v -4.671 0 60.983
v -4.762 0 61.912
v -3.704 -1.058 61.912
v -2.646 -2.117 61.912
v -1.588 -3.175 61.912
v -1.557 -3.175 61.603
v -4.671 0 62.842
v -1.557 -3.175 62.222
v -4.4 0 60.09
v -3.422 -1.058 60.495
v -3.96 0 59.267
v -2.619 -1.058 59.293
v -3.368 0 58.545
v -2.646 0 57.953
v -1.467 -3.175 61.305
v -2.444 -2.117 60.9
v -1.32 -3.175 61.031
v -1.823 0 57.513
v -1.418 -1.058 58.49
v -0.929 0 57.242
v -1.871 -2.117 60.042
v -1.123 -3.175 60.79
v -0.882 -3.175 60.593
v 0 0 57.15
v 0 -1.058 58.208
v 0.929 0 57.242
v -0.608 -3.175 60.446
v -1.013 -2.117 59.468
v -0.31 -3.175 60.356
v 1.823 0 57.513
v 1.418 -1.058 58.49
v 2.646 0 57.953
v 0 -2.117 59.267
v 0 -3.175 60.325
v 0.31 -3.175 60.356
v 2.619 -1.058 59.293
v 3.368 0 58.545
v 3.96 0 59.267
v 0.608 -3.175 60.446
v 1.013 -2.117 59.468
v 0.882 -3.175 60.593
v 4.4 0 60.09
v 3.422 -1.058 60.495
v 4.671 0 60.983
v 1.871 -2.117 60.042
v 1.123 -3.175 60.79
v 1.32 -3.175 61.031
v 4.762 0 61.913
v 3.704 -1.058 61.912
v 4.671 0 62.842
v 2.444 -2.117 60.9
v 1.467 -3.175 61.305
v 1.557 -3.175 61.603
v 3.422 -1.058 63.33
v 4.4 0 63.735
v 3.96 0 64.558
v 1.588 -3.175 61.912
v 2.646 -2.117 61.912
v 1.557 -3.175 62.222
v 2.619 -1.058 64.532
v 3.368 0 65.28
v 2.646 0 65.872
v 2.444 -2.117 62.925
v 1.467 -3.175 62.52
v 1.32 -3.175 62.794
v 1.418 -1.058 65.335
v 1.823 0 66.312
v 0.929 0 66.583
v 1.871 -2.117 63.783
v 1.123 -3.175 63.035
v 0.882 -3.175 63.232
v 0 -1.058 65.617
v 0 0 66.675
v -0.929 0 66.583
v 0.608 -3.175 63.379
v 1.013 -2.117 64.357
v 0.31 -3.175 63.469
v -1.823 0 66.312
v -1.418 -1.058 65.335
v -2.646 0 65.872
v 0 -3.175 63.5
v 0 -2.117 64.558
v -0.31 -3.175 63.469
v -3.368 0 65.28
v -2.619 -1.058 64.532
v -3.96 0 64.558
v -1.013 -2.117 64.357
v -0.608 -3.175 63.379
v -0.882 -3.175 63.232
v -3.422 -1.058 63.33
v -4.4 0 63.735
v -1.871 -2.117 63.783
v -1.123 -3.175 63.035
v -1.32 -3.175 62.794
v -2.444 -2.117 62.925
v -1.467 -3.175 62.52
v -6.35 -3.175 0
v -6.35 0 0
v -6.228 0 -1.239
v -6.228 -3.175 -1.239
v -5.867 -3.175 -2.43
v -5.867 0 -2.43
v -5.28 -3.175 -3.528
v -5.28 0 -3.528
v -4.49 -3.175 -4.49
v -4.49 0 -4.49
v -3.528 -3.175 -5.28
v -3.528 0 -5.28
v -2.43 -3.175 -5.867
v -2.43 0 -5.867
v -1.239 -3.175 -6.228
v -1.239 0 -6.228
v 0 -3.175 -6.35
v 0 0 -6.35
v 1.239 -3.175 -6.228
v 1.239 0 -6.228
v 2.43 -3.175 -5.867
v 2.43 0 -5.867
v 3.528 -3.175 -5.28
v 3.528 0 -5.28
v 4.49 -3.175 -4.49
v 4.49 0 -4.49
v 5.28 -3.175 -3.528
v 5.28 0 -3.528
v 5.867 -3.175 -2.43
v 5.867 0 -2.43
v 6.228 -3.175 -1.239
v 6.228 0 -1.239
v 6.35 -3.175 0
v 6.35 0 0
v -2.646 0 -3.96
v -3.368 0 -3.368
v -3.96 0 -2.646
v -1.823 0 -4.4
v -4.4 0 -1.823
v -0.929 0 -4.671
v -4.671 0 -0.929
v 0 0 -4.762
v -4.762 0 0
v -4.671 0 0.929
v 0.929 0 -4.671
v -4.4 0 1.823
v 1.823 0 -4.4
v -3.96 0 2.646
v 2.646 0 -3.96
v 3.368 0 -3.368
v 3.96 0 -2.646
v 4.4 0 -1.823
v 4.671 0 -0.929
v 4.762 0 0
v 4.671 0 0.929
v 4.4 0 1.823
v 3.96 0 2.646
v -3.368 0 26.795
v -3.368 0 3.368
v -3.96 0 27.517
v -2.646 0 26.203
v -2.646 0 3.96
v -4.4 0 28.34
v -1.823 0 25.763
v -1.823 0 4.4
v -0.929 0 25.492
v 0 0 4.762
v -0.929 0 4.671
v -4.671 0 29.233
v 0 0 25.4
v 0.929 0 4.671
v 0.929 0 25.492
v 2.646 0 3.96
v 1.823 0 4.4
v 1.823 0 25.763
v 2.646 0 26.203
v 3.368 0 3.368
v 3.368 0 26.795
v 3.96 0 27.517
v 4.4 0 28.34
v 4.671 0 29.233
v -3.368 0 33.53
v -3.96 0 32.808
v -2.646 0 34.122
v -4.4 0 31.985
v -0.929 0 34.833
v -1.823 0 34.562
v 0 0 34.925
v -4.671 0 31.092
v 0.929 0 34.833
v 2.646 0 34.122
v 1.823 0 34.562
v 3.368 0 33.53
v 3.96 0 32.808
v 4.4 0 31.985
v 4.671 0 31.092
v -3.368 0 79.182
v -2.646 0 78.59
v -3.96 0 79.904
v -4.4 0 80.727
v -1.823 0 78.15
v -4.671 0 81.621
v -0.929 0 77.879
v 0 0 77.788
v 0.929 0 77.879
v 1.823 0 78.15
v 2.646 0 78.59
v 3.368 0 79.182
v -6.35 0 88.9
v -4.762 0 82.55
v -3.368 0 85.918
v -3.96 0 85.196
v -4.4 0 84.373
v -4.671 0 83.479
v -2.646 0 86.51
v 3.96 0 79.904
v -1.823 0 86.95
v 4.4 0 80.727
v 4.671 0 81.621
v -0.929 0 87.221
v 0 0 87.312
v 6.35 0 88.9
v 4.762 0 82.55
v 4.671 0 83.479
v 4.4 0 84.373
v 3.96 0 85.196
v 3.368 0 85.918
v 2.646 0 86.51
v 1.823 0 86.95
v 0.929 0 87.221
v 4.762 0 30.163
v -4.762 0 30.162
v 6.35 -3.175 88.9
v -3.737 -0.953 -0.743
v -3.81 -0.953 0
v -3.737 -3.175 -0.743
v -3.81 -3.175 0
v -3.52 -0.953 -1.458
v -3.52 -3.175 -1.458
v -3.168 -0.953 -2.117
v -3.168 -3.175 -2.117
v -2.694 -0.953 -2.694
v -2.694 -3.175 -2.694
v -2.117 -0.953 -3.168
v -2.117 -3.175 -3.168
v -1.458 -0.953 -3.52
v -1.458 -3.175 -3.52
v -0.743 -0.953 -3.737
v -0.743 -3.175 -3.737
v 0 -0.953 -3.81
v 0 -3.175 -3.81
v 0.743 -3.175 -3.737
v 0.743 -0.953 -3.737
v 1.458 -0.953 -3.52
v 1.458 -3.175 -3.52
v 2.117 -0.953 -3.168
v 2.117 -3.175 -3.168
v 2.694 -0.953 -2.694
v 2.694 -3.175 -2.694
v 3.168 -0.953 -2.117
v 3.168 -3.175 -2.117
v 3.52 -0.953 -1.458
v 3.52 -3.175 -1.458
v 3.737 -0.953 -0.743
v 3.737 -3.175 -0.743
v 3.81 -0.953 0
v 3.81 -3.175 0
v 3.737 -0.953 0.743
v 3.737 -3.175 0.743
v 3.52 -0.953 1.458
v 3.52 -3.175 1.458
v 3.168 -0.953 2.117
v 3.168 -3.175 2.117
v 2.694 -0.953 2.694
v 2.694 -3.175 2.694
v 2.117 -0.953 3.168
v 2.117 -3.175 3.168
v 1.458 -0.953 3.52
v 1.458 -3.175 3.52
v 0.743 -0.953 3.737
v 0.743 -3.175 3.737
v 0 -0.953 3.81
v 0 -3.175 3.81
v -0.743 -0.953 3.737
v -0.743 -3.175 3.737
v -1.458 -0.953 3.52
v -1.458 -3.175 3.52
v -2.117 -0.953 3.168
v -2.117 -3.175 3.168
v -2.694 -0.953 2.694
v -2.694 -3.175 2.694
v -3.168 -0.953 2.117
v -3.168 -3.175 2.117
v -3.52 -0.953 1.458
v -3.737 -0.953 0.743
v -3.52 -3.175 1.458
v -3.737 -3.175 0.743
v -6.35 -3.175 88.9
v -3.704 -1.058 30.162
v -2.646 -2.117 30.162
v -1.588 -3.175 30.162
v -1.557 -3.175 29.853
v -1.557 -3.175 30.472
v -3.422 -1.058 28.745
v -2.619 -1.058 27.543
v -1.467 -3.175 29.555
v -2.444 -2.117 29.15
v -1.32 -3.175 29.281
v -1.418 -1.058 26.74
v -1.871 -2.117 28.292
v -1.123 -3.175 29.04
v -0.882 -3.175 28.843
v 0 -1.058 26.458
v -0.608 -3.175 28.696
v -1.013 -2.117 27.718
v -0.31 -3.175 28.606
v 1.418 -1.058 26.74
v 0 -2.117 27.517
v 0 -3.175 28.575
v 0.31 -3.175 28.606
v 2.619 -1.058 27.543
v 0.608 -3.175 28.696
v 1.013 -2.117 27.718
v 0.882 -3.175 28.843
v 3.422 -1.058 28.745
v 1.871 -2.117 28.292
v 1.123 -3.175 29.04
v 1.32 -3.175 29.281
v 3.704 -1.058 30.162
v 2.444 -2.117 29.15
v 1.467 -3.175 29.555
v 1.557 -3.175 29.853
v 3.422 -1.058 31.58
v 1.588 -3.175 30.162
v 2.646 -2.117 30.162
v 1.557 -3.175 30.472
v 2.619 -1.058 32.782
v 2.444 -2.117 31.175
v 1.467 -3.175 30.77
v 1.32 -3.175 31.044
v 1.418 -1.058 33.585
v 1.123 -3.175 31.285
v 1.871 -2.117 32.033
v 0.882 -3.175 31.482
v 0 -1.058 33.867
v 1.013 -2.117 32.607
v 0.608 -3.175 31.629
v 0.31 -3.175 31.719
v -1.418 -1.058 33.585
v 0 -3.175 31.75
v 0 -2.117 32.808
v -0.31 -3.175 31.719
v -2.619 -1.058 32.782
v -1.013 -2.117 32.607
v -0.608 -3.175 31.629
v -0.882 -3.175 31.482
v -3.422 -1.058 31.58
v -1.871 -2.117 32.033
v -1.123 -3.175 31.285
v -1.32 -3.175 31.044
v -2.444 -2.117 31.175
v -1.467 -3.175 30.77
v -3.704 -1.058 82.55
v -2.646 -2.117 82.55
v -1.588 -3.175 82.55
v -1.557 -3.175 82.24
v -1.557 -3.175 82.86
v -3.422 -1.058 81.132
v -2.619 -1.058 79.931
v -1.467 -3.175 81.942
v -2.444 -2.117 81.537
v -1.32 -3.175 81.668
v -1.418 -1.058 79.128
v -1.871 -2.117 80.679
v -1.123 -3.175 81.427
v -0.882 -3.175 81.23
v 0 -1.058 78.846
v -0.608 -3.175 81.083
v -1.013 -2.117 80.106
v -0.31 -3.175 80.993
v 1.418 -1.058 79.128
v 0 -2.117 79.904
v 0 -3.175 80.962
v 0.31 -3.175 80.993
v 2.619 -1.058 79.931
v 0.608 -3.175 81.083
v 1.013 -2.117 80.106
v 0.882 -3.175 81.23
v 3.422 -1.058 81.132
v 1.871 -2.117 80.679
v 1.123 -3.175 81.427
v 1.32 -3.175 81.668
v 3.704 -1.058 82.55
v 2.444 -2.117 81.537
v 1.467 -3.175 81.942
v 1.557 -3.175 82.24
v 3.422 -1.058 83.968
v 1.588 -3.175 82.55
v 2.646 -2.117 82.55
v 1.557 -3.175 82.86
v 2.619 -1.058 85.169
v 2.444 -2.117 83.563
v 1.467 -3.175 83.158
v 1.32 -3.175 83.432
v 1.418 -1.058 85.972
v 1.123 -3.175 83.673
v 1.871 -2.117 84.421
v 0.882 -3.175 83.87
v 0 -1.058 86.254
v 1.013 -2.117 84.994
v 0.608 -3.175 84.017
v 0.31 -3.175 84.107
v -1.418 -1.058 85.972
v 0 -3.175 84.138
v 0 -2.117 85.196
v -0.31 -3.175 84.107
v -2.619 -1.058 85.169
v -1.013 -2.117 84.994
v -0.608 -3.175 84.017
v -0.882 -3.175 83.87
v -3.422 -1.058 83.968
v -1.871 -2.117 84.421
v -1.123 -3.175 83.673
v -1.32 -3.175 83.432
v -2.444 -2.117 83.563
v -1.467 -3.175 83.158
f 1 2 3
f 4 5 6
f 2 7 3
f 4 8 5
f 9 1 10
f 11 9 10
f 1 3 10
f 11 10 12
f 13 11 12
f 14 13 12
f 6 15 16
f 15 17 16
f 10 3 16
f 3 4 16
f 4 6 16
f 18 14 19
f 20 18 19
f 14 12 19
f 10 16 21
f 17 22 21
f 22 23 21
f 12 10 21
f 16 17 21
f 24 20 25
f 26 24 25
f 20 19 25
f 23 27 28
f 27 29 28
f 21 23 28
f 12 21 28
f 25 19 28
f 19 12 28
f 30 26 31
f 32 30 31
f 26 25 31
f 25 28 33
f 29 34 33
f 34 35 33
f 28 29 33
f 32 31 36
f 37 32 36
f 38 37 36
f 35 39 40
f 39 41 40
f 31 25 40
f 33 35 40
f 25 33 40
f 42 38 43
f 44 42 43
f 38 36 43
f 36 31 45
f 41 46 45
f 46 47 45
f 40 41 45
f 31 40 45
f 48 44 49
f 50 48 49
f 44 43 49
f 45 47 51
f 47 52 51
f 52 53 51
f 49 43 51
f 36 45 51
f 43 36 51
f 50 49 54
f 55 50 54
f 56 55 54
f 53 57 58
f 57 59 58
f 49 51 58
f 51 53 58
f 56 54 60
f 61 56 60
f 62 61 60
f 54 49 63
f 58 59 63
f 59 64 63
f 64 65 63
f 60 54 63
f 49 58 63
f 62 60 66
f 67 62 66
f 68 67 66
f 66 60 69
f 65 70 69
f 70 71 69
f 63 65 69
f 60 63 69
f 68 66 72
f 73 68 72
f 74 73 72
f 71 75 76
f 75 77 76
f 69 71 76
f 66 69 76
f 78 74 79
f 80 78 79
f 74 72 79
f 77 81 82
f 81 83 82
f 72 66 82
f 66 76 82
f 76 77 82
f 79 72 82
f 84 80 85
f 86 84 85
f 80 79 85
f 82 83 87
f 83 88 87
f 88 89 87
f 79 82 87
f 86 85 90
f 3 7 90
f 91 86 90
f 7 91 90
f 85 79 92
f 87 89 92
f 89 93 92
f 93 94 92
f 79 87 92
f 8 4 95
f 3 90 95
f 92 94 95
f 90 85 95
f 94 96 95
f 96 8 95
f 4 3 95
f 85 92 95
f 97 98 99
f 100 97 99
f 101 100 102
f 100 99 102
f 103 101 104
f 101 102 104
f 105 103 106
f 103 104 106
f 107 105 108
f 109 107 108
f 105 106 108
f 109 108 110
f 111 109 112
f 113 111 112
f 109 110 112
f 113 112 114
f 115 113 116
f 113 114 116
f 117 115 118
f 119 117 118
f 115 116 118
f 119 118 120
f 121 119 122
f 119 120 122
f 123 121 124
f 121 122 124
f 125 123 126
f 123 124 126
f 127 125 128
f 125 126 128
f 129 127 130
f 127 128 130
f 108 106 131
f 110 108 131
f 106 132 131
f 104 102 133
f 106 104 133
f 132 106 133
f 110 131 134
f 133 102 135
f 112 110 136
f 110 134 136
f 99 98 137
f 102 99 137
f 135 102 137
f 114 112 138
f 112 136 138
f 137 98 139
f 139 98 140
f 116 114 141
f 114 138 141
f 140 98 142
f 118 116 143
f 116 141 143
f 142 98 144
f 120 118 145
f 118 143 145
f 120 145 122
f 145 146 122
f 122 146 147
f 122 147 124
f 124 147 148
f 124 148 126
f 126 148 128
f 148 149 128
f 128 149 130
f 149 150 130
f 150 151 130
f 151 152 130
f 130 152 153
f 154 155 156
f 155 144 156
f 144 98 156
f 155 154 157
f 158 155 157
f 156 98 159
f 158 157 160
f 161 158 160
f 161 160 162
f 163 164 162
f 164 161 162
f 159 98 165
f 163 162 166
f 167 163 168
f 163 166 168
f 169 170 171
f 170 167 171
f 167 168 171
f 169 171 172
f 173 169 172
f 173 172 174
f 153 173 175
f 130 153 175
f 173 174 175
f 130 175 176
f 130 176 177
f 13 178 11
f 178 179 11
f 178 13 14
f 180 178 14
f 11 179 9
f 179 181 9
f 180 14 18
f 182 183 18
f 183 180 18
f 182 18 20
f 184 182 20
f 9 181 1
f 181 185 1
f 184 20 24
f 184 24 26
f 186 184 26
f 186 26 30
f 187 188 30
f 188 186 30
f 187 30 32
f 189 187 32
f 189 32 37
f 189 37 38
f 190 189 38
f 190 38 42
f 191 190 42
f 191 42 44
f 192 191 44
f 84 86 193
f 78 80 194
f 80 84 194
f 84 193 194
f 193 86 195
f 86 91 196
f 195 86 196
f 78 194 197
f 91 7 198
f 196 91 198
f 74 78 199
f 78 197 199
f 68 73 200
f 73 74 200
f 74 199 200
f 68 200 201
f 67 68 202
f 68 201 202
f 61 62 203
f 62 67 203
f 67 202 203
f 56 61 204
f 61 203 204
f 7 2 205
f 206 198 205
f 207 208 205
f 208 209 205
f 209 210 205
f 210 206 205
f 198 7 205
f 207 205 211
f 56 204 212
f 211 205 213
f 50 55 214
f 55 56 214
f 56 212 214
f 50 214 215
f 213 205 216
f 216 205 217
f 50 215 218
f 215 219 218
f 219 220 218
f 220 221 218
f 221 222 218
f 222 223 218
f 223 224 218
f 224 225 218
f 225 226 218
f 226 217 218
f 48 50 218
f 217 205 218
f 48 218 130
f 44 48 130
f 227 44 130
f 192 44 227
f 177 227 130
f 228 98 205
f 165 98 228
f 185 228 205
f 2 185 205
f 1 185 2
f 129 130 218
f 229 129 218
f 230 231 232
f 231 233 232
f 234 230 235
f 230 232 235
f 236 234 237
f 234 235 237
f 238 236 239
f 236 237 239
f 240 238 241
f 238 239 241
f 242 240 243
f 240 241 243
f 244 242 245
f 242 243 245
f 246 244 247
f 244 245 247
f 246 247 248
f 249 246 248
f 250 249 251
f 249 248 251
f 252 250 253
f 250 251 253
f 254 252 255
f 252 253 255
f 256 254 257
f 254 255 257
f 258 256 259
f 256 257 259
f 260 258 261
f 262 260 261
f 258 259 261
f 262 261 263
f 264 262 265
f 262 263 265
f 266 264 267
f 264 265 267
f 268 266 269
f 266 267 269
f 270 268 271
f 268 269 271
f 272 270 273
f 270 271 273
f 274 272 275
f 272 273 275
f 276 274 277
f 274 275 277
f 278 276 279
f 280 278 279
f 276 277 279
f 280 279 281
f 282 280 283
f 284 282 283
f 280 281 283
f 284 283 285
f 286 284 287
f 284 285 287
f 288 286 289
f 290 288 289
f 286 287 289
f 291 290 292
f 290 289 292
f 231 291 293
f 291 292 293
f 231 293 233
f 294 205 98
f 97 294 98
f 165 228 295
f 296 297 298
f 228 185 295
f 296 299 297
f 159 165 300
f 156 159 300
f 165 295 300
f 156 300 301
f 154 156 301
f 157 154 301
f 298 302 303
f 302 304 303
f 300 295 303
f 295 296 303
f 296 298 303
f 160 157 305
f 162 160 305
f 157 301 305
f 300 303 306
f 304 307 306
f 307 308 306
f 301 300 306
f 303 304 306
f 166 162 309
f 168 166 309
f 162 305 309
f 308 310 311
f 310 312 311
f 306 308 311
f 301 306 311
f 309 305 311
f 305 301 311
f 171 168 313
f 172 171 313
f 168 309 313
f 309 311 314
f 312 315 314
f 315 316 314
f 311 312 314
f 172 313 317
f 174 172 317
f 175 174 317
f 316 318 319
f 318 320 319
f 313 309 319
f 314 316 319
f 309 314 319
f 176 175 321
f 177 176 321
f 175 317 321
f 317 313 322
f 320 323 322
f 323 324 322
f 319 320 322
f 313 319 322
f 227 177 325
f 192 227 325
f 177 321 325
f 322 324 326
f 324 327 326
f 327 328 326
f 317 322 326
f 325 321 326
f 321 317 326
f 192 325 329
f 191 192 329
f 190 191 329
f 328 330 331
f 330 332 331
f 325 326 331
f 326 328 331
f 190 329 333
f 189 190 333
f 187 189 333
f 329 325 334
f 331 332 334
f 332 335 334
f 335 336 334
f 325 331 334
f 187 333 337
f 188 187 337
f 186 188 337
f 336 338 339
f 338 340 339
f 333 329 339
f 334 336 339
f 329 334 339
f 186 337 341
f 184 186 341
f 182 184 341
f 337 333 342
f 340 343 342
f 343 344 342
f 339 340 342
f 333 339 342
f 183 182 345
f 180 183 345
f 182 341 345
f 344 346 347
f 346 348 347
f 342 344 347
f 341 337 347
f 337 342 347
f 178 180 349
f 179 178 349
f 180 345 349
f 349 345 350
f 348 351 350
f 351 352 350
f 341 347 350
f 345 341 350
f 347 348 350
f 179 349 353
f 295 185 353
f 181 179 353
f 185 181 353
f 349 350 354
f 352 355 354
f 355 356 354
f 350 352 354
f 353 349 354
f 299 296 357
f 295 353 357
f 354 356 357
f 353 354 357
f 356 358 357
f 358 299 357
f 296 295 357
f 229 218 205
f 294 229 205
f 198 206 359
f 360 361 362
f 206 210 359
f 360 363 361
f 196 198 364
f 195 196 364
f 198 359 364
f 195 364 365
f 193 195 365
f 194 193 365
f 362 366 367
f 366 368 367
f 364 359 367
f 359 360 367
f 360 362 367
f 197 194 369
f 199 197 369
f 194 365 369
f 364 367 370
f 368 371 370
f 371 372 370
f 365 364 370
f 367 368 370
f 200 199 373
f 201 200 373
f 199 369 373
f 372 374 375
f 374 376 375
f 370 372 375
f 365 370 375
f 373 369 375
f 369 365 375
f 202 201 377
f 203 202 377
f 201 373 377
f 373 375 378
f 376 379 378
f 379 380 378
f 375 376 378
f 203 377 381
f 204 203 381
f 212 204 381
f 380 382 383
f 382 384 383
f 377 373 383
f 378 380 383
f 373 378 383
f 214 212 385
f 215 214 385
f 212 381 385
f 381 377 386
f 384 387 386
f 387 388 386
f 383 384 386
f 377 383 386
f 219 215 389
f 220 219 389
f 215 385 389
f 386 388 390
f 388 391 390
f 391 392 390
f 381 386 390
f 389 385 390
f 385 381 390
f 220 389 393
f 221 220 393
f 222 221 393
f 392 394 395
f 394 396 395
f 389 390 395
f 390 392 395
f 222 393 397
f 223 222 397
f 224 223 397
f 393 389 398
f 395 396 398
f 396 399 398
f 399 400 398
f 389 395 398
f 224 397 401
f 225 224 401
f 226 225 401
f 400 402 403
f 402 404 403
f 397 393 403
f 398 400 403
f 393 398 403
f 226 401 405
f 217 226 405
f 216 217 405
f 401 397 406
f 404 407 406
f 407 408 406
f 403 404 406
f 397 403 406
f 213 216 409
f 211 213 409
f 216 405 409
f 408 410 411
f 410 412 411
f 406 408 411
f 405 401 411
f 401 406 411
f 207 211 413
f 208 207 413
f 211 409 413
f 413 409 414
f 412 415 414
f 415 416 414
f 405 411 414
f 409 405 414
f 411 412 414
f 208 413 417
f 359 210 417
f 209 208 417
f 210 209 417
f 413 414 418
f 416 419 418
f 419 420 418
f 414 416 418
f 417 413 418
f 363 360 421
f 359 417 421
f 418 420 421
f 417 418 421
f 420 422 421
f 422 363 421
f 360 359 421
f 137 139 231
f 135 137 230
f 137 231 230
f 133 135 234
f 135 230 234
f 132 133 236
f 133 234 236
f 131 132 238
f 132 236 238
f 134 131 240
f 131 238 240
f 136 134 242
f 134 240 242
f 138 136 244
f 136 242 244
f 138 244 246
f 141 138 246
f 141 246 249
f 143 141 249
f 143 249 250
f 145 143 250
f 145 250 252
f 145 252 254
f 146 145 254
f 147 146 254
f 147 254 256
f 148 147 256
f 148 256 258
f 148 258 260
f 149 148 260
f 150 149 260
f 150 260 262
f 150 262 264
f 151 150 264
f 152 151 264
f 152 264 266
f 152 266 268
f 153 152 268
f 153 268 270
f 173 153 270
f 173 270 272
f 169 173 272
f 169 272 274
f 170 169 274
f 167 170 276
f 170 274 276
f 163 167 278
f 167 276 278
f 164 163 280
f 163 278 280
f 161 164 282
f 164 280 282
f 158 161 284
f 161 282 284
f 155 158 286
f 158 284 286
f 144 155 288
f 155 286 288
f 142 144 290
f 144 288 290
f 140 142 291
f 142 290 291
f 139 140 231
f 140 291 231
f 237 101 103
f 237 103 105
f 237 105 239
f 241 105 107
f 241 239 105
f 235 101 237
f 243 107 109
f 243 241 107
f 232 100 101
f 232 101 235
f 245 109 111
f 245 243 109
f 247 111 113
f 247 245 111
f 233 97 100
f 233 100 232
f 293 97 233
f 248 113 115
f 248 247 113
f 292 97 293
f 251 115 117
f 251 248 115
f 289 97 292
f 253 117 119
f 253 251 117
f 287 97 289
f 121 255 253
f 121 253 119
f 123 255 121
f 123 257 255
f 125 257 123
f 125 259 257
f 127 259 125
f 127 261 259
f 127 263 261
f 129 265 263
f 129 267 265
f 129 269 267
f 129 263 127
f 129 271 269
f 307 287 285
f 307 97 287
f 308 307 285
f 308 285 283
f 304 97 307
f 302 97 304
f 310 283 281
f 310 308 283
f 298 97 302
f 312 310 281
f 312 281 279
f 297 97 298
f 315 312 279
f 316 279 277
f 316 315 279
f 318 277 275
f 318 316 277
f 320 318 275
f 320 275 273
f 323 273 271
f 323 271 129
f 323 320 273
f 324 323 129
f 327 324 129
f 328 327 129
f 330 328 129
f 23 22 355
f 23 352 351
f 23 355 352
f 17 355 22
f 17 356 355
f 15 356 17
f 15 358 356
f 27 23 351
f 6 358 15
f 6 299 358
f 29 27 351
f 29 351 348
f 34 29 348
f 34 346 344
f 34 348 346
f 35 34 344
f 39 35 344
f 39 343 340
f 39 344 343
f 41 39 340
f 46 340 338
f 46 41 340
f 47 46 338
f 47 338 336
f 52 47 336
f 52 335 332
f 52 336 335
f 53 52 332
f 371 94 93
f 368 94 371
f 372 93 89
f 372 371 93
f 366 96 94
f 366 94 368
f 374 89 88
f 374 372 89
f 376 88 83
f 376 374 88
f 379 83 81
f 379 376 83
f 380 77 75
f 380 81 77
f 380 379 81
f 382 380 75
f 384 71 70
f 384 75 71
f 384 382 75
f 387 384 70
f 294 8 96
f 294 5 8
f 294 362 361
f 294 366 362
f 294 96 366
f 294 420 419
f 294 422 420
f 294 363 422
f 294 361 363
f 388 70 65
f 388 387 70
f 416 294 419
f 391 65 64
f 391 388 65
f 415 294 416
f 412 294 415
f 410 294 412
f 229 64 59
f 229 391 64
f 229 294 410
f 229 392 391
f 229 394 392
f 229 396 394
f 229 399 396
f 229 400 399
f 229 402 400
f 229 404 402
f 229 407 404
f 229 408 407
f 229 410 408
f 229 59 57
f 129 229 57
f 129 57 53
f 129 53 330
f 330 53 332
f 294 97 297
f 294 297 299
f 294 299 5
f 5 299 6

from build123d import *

# Parameters (mm, degrees)
F1_DEPTH       = 3.175
F2_D           = 2.54
F2_CSINK_D     = 9.525
F2_CSINK_ANGLE = 90
F3_D           = 7.62
F3_CSINK_D     = 9.525
F3_CSINK_ANGLE = 90


with BuildPart() as f1:
    # F0 (on Front) → F1 (new body)
    with BuildSketch(Plane.XZ):
        with BuildLine():
            Line((6.35, 0), (6.35, 88.9))
            Line((6.35, 88.9), (-6.35, 88.9))
            Line((-6.35, 88.9), (-6.35, 0))
            ThreePointArc((-6.35, 0), (0, -6.35), (6.35, 0))
        make_face()
    extrude(amount=F1_DEPTH)

    # F2 (through all)
    with Locations(Plane(origin=(0, 0, 0), x_dir=(1, 0, 0), z_dir=(0, 1, 0))):
        with Locations((0, -82.55), (0, -61.9125), (0, -30.1625)):
            CounterSinkHole(F2_D / 2, F2_CSINK_D / 2, counter_sink_angle=F2_CSINK_ANGLE)

    # F3 (through all)
    with Locations(Plane(origin=(0, 0, 0), x_dir=(1, 0, 0), z_dir=(0, 1, 0))):
        with Locations((0, 0)):
            CounterSinkHole(F3_D / 2, F3_CSINK_D / 2, counter_sink_angle=F3_CSINK_ANGLE)


solid = f1.part
